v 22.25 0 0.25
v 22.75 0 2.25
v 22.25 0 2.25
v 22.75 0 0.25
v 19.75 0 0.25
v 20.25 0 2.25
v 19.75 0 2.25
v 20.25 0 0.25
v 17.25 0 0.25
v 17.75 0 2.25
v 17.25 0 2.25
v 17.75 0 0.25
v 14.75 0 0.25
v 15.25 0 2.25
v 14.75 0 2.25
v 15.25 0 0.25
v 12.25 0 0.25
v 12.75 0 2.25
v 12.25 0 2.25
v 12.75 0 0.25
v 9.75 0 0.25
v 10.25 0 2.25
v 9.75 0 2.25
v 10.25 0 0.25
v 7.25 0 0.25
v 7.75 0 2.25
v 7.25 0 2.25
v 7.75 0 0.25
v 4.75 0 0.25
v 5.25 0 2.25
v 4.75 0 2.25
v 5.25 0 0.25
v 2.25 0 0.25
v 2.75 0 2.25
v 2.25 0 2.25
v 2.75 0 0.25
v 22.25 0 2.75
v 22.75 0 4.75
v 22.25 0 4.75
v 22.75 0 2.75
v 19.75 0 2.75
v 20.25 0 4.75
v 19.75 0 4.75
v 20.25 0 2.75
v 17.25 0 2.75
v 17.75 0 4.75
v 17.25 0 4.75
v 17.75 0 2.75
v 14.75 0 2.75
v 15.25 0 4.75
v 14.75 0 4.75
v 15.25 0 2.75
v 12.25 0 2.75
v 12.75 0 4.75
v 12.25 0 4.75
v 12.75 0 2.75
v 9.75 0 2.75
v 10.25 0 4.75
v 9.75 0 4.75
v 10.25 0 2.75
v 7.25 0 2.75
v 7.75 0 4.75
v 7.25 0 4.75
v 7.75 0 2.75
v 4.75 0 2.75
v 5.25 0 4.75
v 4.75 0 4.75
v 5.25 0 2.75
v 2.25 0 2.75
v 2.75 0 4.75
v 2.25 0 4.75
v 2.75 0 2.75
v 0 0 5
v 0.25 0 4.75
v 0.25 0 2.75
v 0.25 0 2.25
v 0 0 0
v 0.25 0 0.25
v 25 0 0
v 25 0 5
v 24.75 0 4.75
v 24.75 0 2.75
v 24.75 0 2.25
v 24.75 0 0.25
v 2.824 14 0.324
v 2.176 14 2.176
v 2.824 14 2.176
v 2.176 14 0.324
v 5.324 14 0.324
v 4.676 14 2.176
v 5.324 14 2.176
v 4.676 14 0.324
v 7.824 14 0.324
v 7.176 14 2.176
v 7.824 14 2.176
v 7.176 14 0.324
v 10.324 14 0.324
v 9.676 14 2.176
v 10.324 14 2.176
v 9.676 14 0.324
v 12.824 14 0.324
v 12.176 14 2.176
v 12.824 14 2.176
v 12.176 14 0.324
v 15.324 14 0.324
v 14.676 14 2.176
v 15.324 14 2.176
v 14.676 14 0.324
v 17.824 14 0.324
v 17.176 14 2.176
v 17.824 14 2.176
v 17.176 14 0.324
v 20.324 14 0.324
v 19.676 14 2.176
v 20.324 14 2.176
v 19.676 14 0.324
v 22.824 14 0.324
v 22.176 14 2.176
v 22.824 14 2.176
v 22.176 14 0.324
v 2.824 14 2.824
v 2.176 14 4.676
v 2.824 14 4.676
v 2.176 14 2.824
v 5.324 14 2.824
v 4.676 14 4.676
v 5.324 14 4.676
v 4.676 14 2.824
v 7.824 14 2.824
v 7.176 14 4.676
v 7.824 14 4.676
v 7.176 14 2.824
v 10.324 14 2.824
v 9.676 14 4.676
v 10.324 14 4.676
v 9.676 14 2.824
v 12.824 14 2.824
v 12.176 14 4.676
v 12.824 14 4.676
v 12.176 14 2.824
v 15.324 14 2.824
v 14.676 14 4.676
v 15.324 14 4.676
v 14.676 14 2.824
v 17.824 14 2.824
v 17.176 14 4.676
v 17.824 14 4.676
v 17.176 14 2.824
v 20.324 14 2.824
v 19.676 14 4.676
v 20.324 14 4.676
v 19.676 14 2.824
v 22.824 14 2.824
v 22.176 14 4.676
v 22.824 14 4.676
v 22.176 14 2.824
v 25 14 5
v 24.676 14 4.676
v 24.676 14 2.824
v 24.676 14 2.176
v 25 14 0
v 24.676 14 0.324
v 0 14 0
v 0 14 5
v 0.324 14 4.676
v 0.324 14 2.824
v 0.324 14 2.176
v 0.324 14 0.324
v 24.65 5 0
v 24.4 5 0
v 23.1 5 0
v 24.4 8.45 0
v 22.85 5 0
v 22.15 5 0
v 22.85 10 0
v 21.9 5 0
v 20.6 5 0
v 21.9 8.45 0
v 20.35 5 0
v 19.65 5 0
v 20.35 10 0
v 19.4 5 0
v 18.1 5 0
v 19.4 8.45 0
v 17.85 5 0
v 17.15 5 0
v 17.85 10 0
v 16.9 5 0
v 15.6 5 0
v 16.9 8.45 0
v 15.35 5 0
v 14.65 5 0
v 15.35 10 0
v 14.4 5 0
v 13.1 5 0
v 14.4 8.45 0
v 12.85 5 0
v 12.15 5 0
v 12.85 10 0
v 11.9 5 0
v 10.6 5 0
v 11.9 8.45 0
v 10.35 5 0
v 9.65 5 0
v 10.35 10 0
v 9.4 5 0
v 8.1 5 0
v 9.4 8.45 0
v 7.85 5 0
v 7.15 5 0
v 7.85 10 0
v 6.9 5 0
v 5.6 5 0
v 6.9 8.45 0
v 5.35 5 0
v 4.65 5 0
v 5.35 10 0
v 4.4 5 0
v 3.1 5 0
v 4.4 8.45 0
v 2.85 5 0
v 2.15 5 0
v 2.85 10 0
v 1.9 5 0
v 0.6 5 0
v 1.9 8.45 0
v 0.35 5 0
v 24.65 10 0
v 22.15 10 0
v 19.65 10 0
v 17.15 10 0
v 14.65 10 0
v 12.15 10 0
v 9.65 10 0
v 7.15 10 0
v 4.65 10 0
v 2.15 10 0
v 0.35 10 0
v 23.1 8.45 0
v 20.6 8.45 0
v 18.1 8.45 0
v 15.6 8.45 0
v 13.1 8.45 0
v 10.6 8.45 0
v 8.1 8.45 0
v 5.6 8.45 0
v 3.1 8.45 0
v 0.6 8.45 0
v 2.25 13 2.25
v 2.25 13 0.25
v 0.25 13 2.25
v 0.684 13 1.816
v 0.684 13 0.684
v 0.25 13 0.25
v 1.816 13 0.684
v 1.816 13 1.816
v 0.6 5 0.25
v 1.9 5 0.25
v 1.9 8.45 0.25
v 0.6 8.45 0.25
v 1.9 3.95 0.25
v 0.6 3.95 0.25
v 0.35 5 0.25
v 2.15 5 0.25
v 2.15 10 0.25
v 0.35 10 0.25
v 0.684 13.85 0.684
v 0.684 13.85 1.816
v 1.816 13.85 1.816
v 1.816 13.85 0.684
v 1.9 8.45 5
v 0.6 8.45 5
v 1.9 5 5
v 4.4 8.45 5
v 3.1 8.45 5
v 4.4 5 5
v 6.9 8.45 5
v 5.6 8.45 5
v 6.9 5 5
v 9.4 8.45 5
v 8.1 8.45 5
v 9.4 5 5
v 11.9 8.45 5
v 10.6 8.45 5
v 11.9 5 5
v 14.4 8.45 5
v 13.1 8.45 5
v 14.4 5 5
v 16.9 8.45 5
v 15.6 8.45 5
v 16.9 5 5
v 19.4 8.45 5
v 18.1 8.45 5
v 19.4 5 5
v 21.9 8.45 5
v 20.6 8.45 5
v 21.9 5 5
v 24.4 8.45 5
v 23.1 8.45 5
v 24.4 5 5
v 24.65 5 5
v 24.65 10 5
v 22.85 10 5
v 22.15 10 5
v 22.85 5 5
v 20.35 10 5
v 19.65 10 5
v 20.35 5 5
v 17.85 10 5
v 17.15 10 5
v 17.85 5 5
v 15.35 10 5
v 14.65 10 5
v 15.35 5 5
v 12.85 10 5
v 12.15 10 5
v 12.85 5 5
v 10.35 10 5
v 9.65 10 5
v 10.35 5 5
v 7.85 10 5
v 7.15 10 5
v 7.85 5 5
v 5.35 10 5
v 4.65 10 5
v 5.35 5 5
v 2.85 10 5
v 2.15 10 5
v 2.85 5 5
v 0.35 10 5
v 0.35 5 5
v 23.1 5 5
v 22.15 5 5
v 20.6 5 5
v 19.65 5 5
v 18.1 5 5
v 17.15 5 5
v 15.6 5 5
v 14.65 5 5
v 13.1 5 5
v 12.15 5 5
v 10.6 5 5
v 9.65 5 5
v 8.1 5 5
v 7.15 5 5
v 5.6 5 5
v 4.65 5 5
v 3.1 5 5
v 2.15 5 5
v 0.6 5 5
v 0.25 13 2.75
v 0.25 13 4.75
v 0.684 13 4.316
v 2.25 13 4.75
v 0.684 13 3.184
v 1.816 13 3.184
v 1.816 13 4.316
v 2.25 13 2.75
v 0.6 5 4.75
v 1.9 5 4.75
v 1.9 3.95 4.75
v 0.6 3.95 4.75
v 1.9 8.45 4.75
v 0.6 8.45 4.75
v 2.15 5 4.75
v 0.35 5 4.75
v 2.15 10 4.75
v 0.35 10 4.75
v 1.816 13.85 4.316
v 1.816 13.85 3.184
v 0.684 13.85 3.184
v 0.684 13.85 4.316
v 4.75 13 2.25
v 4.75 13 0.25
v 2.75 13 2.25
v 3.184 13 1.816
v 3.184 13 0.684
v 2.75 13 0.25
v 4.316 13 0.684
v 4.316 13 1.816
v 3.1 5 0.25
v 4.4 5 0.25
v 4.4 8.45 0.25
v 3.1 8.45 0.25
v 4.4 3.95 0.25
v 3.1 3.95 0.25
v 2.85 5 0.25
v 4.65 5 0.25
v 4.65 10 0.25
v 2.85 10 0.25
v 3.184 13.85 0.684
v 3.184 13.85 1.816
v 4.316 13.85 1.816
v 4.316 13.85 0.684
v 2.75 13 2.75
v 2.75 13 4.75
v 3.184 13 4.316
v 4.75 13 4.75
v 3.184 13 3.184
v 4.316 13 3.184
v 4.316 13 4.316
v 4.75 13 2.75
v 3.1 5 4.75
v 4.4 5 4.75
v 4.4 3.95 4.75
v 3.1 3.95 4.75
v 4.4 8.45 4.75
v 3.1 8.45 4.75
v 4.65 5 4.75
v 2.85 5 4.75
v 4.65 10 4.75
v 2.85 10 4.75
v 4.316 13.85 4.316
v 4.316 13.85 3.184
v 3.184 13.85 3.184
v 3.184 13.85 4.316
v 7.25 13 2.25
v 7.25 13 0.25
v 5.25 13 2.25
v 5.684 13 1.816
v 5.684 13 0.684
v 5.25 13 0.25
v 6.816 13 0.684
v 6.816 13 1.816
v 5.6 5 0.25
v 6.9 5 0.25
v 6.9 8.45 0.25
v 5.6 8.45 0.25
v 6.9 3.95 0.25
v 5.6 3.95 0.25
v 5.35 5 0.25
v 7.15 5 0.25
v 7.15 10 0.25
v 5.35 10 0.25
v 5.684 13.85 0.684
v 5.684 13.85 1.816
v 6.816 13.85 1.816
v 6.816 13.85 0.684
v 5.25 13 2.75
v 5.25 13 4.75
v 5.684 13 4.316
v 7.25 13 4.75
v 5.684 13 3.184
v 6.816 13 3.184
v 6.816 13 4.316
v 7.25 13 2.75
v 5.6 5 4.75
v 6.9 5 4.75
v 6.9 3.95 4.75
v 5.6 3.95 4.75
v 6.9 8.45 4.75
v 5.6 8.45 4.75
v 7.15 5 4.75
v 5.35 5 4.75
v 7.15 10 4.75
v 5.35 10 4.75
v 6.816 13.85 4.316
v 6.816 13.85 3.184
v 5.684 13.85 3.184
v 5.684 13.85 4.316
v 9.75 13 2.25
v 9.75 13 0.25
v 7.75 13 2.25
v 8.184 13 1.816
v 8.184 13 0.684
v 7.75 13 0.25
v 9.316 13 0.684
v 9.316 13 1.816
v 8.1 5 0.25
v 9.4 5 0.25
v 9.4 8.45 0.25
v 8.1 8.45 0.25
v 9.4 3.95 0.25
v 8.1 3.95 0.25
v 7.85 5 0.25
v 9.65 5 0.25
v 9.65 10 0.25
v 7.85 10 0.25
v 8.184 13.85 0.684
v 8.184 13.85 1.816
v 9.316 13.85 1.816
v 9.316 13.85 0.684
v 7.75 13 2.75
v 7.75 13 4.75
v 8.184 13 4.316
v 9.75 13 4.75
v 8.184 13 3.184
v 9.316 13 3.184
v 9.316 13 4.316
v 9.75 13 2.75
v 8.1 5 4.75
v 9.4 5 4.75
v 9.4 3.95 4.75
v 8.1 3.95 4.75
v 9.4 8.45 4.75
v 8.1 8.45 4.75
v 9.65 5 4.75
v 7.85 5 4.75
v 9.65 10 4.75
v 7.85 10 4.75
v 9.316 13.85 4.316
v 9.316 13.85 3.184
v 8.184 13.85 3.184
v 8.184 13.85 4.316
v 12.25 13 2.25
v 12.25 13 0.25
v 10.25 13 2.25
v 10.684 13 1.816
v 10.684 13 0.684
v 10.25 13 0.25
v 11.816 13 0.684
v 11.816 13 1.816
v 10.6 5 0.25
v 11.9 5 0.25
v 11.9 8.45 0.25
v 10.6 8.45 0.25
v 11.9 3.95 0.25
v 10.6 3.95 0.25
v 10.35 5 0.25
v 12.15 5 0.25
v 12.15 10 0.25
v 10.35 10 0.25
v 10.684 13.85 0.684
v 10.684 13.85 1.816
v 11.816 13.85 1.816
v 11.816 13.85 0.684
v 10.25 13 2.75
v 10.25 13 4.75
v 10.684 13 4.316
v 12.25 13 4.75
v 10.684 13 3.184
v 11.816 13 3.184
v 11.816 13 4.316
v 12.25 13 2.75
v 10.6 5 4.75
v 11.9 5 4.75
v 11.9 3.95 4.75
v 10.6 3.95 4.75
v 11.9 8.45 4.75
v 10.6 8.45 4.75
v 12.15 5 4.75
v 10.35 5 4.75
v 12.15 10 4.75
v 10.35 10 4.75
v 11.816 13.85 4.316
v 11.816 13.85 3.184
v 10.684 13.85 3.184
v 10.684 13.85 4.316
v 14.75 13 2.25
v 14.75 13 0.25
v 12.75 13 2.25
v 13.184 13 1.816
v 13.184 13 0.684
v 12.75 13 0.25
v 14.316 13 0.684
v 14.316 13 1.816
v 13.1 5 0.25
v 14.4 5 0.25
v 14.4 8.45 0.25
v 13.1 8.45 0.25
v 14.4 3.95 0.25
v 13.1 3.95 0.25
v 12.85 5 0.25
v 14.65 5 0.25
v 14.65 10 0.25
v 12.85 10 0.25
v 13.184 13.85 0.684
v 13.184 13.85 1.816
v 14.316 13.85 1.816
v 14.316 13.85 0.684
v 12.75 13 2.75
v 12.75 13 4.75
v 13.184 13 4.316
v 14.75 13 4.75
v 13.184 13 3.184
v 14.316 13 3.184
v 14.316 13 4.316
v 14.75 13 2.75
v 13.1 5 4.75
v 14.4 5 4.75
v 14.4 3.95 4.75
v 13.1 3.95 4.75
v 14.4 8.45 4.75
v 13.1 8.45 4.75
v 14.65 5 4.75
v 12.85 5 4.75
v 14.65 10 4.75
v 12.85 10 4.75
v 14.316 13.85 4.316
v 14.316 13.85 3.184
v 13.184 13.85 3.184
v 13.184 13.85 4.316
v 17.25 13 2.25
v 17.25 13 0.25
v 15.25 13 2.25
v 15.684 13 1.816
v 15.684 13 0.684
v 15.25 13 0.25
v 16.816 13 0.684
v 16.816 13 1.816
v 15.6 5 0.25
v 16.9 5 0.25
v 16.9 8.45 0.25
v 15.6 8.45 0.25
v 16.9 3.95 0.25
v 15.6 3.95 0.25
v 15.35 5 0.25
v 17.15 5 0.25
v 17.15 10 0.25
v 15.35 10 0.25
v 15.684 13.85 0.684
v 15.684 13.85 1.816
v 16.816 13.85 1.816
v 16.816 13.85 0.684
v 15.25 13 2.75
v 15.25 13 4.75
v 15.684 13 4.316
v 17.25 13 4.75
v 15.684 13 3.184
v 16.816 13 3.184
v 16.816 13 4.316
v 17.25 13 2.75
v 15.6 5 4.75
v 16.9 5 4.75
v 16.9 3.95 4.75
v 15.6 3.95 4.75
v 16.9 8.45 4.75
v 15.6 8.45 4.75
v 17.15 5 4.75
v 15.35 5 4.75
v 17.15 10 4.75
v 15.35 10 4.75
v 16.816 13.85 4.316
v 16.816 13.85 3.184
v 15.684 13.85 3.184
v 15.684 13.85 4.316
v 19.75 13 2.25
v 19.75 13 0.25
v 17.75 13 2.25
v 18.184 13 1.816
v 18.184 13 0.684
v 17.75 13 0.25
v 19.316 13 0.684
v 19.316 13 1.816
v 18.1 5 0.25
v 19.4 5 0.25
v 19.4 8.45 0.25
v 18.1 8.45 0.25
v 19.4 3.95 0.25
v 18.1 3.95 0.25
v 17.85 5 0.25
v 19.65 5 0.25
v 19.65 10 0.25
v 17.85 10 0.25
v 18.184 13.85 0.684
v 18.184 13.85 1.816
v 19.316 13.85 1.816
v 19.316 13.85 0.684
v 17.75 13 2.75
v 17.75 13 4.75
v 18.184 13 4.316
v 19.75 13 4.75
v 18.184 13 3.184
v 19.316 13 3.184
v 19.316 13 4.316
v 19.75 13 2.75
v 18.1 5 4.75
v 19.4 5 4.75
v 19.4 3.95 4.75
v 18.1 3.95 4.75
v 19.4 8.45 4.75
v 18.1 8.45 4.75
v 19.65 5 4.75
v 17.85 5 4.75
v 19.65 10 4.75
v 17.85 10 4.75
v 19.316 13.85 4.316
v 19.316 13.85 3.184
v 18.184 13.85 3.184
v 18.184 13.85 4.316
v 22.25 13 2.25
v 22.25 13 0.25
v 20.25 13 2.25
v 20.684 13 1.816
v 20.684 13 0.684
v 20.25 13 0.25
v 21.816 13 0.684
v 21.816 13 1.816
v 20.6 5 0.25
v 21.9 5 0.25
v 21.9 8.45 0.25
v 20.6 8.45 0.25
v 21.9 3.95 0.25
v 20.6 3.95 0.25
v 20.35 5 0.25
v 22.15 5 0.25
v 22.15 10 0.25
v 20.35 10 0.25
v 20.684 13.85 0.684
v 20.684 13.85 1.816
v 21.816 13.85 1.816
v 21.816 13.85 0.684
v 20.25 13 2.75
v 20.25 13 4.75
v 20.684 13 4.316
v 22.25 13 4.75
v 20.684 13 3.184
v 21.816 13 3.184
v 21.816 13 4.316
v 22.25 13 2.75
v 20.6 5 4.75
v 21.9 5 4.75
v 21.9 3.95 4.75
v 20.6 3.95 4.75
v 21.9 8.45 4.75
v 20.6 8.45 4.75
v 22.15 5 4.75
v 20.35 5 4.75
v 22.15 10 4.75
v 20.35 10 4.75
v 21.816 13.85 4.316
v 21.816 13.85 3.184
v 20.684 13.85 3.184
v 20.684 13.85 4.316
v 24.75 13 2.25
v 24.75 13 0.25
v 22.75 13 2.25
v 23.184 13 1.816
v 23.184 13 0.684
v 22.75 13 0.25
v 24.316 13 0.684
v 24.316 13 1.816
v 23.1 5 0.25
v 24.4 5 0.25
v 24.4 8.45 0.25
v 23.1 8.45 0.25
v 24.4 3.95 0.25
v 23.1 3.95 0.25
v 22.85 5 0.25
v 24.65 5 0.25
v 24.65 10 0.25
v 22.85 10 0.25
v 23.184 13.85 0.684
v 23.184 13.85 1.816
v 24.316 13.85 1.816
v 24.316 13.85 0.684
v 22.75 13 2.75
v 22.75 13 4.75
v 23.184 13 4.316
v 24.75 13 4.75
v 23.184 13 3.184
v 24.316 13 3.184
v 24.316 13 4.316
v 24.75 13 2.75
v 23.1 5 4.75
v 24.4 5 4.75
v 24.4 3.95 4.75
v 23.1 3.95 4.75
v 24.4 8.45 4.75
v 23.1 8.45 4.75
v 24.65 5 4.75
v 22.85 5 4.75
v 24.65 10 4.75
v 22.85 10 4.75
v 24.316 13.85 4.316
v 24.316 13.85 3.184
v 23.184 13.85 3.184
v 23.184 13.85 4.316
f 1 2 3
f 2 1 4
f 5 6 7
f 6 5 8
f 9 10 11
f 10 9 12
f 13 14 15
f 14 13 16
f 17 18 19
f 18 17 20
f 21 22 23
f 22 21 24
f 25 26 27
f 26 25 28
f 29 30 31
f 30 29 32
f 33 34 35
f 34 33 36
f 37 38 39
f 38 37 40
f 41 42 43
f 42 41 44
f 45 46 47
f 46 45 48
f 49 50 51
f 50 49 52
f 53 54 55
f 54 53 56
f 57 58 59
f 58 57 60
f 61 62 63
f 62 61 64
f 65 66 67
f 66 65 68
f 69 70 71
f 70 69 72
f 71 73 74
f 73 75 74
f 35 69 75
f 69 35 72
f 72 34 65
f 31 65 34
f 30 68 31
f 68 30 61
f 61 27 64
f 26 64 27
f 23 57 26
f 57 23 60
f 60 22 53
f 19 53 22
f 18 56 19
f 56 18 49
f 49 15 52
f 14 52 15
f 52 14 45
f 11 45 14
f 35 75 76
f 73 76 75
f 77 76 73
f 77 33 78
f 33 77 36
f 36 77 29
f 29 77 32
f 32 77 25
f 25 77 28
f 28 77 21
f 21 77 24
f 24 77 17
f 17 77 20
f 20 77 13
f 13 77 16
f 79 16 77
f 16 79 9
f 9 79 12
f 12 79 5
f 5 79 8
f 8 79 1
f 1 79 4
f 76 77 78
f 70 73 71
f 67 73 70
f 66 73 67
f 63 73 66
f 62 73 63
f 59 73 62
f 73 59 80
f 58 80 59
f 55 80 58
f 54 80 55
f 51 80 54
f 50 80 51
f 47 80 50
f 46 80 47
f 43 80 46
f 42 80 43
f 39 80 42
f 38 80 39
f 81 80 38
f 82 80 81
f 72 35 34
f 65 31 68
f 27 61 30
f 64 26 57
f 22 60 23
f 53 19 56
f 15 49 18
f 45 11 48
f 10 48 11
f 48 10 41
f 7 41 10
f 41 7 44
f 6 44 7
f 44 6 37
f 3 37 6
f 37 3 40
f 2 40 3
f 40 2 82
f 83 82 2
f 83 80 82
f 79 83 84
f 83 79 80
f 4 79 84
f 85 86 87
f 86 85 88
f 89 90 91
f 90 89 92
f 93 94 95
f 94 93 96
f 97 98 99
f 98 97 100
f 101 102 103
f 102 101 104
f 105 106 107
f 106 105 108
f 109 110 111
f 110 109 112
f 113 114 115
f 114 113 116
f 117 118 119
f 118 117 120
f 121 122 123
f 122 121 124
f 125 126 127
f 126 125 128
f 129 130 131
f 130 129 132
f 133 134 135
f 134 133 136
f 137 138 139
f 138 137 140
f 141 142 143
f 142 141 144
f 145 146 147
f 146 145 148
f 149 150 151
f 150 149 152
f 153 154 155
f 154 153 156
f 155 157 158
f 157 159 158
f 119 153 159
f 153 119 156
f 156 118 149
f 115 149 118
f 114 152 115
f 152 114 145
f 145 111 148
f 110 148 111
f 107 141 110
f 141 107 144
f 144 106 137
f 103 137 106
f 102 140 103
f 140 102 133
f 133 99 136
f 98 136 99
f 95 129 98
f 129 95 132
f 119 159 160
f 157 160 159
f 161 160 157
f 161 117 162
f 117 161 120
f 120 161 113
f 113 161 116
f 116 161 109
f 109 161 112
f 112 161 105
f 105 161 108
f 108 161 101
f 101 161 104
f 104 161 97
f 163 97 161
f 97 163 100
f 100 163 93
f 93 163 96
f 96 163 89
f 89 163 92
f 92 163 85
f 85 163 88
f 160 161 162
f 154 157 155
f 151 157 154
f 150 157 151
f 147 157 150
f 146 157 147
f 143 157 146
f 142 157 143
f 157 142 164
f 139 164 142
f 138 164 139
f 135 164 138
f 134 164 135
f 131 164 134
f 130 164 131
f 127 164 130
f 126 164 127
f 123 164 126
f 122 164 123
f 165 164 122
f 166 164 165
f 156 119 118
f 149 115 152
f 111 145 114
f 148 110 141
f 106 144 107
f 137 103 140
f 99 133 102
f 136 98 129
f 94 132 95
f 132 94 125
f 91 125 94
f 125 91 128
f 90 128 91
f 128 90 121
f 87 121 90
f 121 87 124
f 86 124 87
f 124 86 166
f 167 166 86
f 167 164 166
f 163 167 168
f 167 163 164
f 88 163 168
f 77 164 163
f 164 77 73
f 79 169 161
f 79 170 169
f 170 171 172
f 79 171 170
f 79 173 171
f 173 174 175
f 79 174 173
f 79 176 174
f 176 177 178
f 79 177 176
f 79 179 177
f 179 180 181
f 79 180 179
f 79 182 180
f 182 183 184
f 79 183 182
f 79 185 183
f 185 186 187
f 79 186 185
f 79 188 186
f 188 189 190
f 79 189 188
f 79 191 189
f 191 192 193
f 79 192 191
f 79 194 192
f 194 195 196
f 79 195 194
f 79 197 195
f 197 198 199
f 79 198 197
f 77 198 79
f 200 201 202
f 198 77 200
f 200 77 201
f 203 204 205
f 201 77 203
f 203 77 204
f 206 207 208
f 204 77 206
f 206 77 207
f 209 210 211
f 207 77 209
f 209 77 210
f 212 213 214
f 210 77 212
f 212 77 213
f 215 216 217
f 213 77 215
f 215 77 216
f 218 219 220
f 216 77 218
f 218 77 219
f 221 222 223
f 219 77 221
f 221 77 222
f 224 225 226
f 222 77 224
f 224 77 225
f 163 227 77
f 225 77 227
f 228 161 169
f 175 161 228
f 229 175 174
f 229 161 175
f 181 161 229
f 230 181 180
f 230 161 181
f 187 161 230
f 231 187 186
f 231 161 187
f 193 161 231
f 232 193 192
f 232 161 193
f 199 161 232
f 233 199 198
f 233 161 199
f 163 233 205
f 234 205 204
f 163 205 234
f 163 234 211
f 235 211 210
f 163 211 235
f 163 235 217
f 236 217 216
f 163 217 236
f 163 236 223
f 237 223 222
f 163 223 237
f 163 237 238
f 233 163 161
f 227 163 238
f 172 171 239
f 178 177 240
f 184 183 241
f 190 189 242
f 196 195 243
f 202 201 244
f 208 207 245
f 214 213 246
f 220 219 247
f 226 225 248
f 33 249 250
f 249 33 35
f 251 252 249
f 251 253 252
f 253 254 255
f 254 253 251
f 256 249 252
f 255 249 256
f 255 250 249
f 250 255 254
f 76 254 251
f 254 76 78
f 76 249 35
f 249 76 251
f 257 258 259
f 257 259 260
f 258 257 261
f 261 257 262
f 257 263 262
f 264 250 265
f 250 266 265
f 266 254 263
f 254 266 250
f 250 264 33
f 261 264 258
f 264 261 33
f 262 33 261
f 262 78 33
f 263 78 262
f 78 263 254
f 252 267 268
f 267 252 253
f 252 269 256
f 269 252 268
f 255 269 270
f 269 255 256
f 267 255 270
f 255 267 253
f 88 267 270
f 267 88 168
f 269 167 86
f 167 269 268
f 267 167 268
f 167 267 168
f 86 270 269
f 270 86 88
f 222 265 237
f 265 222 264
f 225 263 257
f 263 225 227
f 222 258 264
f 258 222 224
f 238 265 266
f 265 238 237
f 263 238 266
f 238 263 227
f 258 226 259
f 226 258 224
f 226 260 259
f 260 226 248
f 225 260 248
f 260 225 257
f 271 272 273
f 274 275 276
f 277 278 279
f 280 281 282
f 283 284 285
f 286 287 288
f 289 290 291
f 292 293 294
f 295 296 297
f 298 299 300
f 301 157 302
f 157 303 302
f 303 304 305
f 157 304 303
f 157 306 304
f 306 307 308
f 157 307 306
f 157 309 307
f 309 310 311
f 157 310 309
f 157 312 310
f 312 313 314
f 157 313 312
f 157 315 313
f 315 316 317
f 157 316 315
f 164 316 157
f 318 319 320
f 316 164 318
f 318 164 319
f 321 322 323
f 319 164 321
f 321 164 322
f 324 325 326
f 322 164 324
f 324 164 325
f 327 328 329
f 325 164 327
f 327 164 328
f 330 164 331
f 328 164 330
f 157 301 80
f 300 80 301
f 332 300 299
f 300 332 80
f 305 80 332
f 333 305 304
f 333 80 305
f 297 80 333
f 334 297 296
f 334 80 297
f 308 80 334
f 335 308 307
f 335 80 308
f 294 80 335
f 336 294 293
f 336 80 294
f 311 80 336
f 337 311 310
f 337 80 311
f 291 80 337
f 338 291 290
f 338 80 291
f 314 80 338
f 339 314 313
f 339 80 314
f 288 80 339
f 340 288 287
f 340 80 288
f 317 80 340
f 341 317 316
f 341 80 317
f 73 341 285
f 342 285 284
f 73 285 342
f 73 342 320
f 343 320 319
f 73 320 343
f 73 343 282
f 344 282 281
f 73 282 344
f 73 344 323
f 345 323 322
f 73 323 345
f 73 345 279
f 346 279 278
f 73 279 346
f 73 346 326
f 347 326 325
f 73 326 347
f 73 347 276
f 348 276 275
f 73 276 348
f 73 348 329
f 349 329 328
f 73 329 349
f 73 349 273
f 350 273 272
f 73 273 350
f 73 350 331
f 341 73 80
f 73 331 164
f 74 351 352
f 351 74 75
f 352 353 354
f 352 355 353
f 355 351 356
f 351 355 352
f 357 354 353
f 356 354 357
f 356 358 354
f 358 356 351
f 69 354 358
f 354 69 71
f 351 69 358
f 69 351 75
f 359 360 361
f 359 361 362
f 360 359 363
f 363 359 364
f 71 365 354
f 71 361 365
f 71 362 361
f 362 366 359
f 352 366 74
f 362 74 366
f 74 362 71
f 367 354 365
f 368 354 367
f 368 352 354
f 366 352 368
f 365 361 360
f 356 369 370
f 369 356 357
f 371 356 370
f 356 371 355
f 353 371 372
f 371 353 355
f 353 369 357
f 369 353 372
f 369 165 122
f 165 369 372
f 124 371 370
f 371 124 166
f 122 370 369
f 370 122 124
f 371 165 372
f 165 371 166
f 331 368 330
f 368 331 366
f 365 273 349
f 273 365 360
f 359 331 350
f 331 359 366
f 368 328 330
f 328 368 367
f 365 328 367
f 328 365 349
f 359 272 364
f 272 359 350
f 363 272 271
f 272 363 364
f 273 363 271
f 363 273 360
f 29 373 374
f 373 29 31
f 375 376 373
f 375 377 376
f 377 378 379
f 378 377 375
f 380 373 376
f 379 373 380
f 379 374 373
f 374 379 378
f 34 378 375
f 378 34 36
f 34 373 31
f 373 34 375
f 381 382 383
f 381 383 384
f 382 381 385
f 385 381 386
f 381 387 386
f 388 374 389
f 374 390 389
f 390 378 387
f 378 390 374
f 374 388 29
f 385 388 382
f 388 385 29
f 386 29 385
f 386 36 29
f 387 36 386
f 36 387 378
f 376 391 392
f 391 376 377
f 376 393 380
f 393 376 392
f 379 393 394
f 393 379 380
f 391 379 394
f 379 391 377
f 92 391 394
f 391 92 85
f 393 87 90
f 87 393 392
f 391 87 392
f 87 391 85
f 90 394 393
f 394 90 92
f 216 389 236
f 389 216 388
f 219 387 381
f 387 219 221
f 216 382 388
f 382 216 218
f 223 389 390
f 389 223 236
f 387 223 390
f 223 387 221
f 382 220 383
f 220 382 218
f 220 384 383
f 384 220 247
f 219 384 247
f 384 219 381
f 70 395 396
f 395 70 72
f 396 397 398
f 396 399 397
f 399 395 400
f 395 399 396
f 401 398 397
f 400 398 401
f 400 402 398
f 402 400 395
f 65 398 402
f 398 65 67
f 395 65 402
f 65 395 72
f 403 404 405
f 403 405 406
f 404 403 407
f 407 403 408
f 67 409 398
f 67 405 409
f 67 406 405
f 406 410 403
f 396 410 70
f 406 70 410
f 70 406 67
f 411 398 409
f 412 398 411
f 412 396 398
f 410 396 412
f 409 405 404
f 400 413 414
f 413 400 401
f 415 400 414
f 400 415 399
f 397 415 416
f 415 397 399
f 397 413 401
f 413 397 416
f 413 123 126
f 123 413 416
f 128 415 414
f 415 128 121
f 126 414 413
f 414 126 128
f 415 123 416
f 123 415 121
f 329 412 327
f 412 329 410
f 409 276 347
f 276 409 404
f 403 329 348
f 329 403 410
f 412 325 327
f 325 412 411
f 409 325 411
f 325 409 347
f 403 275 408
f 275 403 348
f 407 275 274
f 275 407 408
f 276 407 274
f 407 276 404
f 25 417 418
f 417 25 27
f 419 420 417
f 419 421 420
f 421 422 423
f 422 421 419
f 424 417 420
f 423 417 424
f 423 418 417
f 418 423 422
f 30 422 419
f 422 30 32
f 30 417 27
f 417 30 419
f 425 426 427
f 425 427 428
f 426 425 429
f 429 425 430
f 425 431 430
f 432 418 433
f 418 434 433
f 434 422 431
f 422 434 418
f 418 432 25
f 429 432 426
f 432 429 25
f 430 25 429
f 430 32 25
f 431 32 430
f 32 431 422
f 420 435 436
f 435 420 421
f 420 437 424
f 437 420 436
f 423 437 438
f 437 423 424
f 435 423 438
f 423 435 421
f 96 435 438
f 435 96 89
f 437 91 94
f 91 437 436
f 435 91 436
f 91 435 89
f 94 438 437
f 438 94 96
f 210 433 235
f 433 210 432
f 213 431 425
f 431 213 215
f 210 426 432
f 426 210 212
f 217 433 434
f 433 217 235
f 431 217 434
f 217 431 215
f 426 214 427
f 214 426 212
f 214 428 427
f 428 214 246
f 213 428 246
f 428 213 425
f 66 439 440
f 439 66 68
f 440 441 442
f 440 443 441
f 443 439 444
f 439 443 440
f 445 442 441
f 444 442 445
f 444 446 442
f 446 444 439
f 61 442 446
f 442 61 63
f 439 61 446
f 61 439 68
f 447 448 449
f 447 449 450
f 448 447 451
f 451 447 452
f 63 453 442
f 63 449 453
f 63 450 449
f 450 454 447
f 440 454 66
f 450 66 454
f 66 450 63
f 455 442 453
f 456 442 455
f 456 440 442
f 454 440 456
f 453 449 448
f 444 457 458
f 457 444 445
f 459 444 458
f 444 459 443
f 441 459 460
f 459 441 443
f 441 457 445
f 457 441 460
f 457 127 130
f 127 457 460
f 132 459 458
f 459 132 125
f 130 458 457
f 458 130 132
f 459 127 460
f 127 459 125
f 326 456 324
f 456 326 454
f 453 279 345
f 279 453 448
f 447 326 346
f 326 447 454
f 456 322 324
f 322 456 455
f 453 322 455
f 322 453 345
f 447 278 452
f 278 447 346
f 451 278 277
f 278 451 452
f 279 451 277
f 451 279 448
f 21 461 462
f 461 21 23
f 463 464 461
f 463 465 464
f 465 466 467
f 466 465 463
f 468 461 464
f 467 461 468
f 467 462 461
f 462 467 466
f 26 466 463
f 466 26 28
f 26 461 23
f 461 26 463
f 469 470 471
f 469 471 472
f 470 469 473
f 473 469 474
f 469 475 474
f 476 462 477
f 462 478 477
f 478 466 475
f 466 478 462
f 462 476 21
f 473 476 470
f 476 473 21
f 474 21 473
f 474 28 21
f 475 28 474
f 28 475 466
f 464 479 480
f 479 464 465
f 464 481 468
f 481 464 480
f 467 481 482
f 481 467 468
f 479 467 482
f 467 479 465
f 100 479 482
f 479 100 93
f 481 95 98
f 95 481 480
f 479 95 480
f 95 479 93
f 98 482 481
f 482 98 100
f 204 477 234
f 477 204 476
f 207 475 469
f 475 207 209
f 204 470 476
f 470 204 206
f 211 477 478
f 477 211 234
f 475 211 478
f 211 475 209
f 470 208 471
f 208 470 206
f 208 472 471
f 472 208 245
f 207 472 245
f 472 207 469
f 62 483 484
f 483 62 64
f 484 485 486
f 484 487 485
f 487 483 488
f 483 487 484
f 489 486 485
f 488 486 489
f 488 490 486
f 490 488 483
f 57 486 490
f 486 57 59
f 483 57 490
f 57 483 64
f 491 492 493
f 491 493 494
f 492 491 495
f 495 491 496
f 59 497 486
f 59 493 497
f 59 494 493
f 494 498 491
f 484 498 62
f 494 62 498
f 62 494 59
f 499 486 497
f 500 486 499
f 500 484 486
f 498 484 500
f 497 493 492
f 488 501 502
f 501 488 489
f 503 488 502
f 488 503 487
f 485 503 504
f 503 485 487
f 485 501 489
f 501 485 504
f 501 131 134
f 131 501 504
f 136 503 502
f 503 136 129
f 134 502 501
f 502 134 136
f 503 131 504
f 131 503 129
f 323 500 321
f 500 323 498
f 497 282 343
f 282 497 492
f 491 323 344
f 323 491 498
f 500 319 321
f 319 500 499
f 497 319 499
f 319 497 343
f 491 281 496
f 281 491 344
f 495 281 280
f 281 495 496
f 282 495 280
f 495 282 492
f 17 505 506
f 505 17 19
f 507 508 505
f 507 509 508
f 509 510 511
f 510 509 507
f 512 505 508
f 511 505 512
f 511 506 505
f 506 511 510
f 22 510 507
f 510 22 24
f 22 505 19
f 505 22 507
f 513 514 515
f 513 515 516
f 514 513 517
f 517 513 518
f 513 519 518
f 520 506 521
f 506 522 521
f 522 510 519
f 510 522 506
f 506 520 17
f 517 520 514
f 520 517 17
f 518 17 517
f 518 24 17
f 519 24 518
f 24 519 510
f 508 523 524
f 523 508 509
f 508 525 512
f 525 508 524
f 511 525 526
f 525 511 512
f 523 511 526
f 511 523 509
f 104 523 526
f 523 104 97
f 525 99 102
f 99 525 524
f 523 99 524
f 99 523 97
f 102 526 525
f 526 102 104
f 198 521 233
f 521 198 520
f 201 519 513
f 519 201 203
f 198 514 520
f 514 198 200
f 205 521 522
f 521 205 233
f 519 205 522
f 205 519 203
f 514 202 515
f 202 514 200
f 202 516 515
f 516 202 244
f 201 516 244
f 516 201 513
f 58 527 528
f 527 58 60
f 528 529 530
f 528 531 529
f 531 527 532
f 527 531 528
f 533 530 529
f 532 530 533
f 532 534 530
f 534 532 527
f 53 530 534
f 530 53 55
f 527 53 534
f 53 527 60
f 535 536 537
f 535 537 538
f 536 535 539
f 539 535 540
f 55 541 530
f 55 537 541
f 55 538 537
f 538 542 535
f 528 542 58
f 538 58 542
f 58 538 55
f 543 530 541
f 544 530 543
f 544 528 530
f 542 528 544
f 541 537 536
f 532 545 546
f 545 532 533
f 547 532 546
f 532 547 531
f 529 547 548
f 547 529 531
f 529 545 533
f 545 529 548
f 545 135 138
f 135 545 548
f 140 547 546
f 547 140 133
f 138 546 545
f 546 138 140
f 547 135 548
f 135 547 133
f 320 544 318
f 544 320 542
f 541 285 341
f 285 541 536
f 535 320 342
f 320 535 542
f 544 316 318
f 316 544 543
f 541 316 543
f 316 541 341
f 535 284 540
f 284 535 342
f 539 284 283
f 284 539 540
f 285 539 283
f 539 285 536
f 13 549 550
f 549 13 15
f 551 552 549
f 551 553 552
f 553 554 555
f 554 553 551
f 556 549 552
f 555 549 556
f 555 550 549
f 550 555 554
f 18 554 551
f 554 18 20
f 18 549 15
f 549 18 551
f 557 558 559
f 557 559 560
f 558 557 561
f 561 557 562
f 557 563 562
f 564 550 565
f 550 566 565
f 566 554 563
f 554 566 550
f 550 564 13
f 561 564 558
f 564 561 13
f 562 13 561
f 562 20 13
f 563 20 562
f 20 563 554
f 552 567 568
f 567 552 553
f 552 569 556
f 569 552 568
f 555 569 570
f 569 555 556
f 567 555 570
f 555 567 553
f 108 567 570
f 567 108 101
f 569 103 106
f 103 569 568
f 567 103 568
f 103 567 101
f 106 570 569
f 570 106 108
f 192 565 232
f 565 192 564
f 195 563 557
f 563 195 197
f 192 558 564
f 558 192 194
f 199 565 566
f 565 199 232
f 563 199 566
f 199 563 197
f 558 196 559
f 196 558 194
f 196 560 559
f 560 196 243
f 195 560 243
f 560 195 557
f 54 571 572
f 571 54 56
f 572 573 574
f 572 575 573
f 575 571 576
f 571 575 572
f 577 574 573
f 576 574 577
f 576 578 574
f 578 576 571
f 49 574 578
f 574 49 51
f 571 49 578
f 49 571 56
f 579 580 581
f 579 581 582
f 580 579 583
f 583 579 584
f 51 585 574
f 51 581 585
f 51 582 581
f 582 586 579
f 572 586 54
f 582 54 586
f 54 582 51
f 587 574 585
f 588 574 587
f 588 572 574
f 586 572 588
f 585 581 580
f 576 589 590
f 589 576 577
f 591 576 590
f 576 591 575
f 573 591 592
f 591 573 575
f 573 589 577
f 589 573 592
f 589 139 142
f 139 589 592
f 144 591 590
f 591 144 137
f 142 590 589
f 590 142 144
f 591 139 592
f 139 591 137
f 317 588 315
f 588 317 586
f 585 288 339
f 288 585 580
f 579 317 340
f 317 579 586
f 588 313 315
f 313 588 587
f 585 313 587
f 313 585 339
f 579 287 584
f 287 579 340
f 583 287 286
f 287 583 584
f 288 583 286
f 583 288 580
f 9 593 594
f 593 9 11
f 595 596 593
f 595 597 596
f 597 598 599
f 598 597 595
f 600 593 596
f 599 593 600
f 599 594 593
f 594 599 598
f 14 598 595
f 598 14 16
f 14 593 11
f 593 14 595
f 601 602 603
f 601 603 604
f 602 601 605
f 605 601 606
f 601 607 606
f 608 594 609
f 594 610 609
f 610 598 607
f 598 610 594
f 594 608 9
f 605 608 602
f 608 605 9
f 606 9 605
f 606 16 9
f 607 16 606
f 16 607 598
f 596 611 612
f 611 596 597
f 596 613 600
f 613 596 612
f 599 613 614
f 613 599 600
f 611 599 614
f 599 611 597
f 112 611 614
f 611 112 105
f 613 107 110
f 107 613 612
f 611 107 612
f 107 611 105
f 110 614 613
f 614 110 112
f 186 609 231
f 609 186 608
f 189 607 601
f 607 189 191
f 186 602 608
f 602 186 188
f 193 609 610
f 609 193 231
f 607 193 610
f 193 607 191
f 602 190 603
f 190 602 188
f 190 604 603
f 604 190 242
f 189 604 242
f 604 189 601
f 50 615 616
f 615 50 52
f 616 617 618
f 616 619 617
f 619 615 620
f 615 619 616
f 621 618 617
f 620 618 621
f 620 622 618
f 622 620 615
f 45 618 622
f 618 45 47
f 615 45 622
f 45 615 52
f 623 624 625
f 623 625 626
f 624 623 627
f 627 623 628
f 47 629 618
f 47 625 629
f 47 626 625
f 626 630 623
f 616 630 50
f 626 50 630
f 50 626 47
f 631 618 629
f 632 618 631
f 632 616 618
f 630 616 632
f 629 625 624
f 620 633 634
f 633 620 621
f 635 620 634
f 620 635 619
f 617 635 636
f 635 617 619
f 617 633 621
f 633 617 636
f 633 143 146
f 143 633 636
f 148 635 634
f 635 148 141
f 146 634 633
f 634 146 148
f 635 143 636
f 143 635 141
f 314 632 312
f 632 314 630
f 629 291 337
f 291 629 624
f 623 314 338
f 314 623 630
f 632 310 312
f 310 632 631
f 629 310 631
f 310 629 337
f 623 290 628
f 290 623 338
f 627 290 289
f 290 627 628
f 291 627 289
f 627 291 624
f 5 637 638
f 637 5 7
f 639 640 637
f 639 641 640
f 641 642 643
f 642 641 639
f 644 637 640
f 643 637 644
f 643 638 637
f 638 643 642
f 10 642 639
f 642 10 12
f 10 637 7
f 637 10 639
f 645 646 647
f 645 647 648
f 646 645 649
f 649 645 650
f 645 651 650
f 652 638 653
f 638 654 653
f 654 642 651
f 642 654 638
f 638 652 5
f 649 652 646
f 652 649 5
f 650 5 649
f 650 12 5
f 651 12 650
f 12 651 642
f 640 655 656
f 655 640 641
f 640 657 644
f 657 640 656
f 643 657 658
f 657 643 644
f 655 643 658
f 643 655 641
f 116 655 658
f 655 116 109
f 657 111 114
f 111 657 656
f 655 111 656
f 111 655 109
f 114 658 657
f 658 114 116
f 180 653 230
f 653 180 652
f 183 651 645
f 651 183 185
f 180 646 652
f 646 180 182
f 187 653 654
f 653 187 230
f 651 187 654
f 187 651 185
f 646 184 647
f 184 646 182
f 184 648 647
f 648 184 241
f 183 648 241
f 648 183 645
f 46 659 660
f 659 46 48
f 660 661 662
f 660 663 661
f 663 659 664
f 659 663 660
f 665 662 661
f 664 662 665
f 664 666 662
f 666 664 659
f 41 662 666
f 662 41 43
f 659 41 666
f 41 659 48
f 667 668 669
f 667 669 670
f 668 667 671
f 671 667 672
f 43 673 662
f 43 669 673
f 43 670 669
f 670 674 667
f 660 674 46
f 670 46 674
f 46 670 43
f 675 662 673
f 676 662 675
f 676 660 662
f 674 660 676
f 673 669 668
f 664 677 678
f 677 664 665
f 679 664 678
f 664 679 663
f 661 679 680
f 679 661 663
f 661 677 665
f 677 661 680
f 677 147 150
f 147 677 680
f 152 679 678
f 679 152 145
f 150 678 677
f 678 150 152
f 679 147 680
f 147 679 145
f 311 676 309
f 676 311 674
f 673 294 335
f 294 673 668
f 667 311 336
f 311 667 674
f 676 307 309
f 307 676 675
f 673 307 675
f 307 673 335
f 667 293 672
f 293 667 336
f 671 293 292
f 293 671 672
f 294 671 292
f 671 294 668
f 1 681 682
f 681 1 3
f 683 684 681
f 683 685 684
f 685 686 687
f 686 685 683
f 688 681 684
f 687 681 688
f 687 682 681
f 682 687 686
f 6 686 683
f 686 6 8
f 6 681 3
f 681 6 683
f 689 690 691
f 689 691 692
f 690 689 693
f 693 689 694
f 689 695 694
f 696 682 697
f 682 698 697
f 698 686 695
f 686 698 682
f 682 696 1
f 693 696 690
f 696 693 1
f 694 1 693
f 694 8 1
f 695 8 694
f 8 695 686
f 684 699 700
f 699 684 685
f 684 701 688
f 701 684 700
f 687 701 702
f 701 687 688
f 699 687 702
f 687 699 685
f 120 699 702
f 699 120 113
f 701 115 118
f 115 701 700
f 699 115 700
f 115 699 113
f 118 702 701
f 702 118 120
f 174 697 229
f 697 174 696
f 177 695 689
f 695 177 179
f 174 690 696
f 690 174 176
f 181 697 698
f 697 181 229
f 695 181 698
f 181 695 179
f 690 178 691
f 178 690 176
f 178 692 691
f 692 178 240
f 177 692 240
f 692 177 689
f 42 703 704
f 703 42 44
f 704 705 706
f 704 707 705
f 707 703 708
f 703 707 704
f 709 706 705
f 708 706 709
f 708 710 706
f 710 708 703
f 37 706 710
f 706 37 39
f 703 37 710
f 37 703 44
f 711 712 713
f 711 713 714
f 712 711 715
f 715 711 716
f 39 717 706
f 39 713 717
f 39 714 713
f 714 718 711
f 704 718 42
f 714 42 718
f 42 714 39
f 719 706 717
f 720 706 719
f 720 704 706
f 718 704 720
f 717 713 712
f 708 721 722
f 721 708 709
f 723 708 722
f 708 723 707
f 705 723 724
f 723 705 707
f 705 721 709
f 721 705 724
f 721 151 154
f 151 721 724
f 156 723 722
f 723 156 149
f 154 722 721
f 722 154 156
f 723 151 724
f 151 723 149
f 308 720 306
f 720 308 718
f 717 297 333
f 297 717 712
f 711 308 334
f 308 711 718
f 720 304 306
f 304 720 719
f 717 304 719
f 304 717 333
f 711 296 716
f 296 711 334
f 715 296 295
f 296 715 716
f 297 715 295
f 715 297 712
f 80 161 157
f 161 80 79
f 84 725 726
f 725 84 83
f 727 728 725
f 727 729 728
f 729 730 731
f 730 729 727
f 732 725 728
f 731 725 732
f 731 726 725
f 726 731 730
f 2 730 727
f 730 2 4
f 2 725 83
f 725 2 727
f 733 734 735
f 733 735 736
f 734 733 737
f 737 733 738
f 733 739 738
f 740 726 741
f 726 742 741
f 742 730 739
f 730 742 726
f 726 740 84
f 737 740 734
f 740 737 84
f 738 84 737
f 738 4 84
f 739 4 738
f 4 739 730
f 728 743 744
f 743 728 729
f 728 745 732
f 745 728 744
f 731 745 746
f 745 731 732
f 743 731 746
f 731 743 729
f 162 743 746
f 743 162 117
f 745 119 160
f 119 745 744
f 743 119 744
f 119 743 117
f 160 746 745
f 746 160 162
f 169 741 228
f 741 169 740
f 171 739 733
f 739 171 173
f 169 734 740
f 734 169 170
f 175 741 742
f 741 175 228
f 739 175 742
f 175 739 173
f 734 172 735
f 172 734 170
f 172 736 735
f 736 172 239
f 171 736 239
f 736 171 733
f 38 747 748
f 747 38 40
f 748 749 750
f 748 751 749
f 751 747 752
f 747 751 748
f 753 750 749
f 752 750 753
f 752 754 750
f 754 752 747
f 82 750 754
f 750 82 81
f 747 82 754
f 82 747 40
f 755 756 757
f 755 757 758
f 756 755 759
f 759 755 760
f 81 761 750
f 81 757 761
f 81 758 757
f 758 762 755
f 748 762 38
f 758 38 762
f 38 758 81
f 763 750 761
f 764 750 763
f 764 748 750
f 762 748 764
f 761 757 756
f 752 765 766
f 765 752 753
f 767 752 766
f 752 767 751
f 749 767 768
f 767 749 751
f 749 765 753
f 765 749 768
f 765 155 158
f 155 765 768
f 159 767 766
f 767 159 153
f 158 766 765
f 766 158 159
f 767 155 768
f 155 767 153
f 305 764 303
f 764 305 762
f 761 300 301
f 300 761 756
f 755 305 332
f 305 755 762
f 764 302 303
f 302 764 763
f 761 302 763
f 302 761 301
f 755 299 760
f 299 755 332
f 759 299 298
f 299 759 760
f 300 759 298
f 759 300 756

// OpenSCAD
// the number of "shells" to make in one row
count = 10;
// row version
dual = "TRUE"; // [FALSE: One row, TRUE: Two rows]

module shell() {
    translate([2.5/2, 7, 2.5/2]) 
    rotate([90, 0, 0])
    union() {
        difference() {
            cube([2.5, 2.5, 14], center=true);
            // inner hole/hollow
            translate([0, 0, 1])
                cube([2, 2, 14], center=true);
            // pin hole
            rotate([0, 0, 45])
                cylinder(r=0.8, h=60, center=true, $fn=4);
            // chamfer
            translate([0, 0, -7.1]) rotate([0, 0, 45]) 
                cylinder(r1=2.5, r2=0.8, h=0.5, center=true, $fn=4);
            // tab hole 
            translate([0, -1, -0.5])
            cube([1.8, 1, 5], center=true);
        }
        // tab
        translate([0, -1.125, 0.8])
            cube([1.3, 0.25, 4.5], center=true);
    }
}


for(i = [0:count-1]) 
 {  translate([2.5*i, 0, 0])
        shell();
    if (dual == "TRUE")
        translate([2.5*i+2.5, 0, 5])
        rotate([0, 180, 0])  shell();
 }
